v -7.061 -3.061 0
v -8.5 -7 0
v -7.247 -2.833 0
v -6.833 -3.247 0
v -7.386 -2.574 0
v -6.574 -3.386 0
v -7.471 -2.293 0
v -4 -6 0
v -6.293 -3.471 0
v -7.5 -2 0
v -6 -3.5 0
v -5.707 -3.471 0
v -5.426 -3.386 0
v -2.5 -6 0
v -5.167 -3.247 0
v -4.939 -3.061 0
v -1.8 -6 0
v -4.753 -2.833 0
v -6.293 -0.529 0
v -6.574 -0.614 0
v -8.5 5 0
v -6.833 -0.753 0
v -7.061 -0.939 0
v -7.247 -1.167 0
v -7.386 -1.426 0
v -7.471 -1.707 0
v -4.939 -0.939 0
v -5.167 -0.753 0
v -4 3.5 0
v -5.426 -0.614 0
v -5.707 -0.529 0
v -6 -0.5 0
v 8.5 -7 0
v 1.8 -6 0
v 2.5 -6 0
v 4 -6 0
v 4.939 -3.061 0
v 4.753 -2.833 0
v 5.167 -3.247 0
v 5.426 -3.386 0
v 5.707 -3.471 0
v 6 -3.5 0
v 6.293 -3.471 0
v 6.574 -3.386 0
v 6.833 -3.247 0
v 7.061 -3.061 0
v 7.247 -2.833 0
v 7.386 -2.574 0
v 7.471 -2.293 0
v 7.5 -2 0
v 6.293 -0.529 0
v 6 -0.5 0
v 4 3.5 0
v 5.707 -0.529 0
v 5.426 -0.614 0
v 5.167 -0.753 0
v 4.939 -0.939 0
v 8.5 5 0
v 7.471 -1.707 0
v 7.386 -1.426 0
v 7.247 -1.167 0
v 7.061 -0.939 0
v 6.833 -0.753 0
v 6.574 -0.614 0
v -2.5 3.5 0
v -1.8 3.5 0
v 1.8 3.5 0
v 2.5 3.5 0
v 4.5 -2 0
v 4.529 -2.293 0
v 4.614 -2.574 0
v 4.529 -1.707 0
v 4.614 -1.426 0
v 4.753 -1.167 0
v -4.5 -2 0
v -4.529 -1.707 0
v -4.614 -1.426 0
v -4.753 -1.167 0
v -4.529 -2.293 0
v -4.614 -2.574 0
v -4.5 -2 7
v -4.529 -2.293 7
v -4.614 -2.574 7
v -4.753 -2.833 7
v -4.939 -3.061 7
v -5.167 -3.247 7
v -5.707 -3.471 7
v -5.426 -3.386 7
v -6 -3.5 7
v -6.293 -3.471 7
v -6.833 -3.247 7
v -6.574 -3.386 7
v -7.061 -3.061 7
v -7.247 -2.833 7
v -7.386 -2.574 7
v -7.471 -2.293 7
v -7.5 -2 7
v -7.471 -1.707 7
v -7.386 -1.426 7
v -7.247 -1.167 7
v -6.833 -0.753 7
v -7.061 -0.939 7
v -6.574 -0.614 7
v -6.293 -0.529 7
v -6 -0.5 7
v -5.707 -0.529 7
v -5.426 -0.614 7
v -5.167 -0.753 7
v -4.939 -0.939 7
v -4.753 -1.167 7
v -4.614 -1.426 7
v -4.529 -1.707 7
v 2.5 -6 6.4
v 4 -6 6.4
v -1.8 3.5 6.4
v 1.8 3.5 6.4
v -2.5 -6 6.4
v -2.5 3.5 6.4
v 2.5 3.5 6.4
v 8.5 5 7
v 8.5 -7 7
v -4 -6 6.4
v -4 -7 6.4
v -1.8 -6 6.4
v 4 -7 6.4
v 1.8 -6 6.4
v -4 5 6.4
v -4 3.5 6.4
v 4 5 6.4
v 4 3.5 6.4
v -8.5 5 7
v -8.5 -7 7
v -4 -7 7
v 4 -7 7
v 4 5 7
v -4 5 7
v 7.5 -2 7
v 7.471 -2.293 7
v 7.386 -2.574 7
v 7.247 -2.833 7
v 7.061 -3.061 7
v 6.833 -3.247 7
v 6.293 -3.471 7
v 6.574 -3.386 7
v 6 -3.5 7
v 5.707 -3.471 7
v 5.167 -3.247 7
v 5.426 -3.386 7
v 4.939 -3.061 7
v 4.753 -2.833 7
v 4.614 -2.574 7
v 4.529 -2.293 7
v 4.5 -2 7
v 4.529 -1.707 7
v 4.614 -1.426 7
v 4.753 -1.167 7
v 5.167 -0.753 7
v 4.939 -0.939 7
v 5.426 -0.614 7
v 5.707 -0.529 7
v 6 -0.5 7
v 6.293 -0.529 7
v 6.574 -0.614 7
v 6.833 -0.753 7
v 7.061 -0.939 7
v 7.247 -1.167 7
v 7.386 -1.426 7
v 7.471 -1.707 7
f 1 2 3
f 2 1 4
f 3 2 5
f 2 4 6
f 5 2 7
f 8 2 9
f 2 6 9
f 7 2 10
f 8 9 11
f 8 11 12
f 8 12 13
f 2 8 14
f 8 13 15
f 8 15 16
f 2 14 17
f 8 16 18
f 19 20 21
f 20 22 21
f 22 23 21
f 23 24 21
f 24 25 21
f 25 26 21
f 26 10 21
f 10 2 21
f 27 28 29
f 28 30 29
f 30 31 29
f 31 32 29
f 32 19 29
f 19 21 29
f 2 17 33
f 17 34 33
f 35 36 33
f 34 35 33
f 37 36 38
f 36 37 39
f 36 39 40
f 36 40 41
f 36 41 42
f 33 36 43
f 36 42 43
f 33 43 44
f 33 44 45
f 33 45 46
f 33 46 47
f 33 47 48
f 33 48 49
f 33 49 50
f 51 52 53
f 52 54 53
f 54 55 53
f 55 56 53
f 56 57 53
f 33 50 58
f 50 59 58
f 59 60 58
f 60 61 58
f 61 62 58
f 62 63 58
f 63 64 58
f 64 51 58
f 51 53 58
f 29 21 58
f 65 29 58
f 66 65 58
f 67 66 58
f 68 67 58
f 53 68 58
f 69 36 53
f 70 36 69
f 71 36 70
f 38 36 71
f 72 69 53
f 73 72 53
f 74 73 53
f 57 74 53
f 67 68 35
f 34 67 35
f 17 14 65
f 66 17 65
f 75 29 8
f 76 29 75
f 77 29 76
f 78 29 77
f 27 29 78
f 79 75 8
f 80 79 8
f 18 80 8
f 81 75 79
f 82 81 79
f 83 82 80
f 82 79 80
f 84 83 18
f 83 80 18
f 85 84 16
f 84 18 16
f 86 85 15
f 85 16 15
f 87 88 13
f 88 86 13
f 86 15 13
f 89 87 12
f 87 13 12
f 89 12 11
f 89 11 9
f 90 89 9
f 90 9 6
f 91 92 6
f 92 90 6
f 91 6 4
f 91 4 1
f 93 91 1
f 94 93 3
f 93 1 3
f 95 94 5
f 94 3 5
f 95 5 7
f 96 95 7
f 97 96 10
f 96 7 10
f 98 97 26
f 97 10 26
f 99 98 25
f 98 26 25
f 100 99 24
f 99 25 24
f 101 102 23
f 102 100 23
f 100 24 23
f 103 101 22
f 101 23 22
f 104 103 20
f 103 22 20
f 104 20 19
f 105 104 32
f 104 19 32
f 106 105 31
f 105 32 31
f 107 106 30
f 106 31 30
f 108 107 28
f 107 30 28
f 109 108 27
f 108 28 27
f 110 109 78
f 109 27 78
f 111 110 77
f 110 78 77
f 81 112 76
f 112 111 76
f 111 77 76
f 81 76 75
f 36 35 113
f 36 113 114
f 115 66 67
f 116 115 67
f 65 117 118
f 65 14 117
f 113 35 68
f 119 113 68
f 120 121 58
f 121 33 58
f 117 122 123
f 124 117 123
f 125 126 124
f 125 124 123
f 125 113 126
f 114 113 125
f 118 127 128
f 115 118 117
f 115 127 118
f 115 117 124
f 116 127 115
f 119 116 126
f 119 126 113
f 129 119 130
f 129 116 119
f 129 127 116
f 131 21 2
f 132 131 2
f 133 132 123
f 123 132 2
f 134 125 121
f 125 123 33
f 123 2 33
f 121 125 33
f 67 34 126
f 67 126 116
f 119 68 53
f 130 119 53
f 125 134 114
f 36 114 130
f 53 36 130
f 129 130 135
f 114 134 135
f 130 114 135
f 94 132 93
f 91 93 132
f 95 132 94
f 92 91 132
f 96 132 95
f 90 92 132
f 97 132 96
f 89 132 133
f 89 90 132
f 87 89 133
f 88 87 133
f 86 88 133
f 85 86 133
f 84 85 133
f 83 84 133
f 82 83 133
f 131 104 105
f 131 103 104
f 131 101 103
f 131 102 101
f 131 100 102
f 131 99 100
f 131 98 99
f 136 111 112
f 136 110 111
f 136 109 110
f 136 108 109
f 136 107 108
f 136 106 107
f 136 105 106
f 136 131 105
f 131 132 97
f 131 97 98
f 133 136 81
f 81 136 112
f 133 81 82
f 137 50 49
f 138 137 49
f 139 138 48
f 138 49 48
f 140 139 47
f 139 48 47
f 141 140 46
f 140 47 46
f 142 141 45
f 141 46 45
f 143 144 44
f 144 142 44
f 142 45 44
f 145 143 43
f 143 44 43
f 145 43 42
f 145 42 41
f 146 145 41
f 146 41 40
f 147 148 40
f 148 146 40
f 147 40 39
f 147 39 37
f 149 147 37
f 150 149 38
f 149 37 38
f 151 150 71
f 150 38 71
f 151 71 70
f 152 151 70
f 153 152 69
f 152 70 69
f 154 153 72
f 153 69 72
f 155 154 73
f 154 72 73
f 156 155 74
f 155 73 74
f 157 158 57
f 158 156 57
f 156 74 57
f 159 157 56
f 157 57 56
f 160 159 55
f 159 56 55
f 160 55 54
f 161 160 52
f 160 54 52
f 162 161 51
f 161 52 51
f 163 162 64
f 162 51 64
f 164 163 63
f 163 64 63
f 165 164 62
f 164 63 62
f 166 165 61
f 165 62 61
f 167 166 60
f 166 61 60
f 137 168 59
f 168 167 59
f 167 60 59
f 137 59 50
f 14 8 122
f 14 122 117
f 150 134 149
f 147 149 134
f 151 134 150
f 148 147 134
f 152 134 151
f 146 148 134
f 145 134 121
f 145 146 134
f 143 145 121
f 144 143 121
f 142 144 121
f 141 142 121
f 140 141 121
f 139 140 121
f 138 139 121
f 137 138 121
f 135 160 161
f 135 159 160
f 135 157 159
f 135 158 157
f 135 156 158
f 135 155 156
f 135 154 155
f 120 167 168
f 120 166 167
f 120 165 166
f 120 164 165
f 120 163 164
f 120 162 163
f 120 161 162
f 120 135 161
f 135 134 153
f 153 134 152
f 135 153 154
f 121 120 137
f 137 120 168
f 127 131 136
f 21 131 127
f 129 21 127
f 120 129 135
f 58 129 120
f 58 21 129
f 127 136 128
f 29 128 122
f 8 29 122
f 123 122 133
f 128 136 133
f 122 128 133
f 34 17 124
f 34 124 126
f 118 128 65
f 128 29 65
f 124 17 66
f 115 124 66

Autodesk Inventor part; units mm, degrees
ref_plane "YZ Plane" through (0, 0, 0) normal (1, 0, 0) x (0, 1, 0)
ref_plane "XZ Plane" through (0, 0, 0) normal (0, 1, 0) x (-1, 0, 0)
ref_plane "XY Plane" through (0, 0, 0) normal (0, 0, 1) x (1, 0, 0)
sketch "スケッチ1" plane through (0, 0, 0) normal (0, 0, 1) x (1, 0, 0)
  line L0 (8.5, 7) -> (-8.5, 7)
  line L1 (-8.5, 7) -> (-8.5, -7)
  line L2 (-8.5, -7) -> (8.5, -7)
  line L3 (8.5, -7) -> (8.5, 7)
  line L4 (8.5, 7) -> (-8.5, -7) construction
  line L5 (-8.5, 7) -> (8.5, -7) construction
  circle A0 centre (-6, -2) radius 1.5
  circle A1 centre (6, -2) radius 1.5
  line L6 (-8.5, -6) -> (8.5, -6)
  line L7 (-8.5, 3.5) -> (8.5, 3.5)
  line L8 (-4, -7) -> (-4, 7)
  line L9 (4, -7) -> (4, 7)
  line L10 (2.5, -6) -> (2.5, 3.5)
  line L11 (-2.5, -6) -> (-2.5, 3.5)
  line L12 (1.8, -6) -> (1.8, 3.5)
  line L13 (-1.8, -6) -> (-1.8, 3.5)
  point P0 (0, 0)
  point P1 (-4, -6)
  point P2 (-4, 3.5)
  point P3 (4, -6)
  point P4 (4, 3.5)
  dimension "d0" = 17
  dimension "d1" = 14
  dimension "d2" = 3
  dimension "d3" = 3
  dimension "d4" = 3.5
  dimension "d5" = 4.5
  dimension "d6" = 4.5
  dimension "d7" = 1.5
  dimension "d8" = 1.5
  dimension "d9" = 1
  dimension "d16" = 0.7
  dimension "d17" = 0.7
  dimension "d22" = 5
  dimension "d23" = 5
extrude "押し出し1" add sketch "スケッチ1" along normal blind 7 contours L3 L7 L9 L0 | L9 L7 L8 L0 | L3 L6 L9 L7 | L8 L7 L1 L0 | L3 L2 L9 L6 | L8 L6 L1 L7 | L10 L6 L12 L7 | L9 L2 L8 L6 | L7 L13 L6 L11 | L8 L2 L1 L6
sketch "スケッチ2" plane through (0, 0, 7) normal (0, 0, 1) x (1, 0, 0)
  line L0 (8.5, 7) -> (-8.5, 7) projected
  line L1 (0, 7) -> (-4, 7)
  line L2 (-4, 7) -> (-4, -7)
  line L3 (-8.5, -7) -> (8.5, -7) projected
  line L4 (-4, -7) -> (4, -7)
  line L5 (4, -7) -> (4, 7)
  line L6 (4, 7) -> (0, 7)
  point P0 (0, 0)
  dimension "d12" = 4
  dimension "d13" = 8
extrude "押し出し2" cut sketch "スケッチ2" against normal blind 0.6
sketch "スケッチ3" plane through (-8.5, 7, 0) normal (0, 1, 0) x (1, 0, 0)
  line L0 (0, 0) -> (0, -7) projected
  line L1 (17, 0) -> (17, -7) projected
  line L2 (0, 0) -> (17, 0)
  line L3 (17, 0) -> (17, -7)
  line L4 (17, -7) -> (0, -7)
  line L5 (0, -7) -> (0, 0)
  point P0 (8.5, 0)
  point P1 (0, -7)
extrude "押し出し3" cut sketch "スケッチ3" against normal blind 2
properties part number "greiper_TPU" material "ゴム、シリコーン"
